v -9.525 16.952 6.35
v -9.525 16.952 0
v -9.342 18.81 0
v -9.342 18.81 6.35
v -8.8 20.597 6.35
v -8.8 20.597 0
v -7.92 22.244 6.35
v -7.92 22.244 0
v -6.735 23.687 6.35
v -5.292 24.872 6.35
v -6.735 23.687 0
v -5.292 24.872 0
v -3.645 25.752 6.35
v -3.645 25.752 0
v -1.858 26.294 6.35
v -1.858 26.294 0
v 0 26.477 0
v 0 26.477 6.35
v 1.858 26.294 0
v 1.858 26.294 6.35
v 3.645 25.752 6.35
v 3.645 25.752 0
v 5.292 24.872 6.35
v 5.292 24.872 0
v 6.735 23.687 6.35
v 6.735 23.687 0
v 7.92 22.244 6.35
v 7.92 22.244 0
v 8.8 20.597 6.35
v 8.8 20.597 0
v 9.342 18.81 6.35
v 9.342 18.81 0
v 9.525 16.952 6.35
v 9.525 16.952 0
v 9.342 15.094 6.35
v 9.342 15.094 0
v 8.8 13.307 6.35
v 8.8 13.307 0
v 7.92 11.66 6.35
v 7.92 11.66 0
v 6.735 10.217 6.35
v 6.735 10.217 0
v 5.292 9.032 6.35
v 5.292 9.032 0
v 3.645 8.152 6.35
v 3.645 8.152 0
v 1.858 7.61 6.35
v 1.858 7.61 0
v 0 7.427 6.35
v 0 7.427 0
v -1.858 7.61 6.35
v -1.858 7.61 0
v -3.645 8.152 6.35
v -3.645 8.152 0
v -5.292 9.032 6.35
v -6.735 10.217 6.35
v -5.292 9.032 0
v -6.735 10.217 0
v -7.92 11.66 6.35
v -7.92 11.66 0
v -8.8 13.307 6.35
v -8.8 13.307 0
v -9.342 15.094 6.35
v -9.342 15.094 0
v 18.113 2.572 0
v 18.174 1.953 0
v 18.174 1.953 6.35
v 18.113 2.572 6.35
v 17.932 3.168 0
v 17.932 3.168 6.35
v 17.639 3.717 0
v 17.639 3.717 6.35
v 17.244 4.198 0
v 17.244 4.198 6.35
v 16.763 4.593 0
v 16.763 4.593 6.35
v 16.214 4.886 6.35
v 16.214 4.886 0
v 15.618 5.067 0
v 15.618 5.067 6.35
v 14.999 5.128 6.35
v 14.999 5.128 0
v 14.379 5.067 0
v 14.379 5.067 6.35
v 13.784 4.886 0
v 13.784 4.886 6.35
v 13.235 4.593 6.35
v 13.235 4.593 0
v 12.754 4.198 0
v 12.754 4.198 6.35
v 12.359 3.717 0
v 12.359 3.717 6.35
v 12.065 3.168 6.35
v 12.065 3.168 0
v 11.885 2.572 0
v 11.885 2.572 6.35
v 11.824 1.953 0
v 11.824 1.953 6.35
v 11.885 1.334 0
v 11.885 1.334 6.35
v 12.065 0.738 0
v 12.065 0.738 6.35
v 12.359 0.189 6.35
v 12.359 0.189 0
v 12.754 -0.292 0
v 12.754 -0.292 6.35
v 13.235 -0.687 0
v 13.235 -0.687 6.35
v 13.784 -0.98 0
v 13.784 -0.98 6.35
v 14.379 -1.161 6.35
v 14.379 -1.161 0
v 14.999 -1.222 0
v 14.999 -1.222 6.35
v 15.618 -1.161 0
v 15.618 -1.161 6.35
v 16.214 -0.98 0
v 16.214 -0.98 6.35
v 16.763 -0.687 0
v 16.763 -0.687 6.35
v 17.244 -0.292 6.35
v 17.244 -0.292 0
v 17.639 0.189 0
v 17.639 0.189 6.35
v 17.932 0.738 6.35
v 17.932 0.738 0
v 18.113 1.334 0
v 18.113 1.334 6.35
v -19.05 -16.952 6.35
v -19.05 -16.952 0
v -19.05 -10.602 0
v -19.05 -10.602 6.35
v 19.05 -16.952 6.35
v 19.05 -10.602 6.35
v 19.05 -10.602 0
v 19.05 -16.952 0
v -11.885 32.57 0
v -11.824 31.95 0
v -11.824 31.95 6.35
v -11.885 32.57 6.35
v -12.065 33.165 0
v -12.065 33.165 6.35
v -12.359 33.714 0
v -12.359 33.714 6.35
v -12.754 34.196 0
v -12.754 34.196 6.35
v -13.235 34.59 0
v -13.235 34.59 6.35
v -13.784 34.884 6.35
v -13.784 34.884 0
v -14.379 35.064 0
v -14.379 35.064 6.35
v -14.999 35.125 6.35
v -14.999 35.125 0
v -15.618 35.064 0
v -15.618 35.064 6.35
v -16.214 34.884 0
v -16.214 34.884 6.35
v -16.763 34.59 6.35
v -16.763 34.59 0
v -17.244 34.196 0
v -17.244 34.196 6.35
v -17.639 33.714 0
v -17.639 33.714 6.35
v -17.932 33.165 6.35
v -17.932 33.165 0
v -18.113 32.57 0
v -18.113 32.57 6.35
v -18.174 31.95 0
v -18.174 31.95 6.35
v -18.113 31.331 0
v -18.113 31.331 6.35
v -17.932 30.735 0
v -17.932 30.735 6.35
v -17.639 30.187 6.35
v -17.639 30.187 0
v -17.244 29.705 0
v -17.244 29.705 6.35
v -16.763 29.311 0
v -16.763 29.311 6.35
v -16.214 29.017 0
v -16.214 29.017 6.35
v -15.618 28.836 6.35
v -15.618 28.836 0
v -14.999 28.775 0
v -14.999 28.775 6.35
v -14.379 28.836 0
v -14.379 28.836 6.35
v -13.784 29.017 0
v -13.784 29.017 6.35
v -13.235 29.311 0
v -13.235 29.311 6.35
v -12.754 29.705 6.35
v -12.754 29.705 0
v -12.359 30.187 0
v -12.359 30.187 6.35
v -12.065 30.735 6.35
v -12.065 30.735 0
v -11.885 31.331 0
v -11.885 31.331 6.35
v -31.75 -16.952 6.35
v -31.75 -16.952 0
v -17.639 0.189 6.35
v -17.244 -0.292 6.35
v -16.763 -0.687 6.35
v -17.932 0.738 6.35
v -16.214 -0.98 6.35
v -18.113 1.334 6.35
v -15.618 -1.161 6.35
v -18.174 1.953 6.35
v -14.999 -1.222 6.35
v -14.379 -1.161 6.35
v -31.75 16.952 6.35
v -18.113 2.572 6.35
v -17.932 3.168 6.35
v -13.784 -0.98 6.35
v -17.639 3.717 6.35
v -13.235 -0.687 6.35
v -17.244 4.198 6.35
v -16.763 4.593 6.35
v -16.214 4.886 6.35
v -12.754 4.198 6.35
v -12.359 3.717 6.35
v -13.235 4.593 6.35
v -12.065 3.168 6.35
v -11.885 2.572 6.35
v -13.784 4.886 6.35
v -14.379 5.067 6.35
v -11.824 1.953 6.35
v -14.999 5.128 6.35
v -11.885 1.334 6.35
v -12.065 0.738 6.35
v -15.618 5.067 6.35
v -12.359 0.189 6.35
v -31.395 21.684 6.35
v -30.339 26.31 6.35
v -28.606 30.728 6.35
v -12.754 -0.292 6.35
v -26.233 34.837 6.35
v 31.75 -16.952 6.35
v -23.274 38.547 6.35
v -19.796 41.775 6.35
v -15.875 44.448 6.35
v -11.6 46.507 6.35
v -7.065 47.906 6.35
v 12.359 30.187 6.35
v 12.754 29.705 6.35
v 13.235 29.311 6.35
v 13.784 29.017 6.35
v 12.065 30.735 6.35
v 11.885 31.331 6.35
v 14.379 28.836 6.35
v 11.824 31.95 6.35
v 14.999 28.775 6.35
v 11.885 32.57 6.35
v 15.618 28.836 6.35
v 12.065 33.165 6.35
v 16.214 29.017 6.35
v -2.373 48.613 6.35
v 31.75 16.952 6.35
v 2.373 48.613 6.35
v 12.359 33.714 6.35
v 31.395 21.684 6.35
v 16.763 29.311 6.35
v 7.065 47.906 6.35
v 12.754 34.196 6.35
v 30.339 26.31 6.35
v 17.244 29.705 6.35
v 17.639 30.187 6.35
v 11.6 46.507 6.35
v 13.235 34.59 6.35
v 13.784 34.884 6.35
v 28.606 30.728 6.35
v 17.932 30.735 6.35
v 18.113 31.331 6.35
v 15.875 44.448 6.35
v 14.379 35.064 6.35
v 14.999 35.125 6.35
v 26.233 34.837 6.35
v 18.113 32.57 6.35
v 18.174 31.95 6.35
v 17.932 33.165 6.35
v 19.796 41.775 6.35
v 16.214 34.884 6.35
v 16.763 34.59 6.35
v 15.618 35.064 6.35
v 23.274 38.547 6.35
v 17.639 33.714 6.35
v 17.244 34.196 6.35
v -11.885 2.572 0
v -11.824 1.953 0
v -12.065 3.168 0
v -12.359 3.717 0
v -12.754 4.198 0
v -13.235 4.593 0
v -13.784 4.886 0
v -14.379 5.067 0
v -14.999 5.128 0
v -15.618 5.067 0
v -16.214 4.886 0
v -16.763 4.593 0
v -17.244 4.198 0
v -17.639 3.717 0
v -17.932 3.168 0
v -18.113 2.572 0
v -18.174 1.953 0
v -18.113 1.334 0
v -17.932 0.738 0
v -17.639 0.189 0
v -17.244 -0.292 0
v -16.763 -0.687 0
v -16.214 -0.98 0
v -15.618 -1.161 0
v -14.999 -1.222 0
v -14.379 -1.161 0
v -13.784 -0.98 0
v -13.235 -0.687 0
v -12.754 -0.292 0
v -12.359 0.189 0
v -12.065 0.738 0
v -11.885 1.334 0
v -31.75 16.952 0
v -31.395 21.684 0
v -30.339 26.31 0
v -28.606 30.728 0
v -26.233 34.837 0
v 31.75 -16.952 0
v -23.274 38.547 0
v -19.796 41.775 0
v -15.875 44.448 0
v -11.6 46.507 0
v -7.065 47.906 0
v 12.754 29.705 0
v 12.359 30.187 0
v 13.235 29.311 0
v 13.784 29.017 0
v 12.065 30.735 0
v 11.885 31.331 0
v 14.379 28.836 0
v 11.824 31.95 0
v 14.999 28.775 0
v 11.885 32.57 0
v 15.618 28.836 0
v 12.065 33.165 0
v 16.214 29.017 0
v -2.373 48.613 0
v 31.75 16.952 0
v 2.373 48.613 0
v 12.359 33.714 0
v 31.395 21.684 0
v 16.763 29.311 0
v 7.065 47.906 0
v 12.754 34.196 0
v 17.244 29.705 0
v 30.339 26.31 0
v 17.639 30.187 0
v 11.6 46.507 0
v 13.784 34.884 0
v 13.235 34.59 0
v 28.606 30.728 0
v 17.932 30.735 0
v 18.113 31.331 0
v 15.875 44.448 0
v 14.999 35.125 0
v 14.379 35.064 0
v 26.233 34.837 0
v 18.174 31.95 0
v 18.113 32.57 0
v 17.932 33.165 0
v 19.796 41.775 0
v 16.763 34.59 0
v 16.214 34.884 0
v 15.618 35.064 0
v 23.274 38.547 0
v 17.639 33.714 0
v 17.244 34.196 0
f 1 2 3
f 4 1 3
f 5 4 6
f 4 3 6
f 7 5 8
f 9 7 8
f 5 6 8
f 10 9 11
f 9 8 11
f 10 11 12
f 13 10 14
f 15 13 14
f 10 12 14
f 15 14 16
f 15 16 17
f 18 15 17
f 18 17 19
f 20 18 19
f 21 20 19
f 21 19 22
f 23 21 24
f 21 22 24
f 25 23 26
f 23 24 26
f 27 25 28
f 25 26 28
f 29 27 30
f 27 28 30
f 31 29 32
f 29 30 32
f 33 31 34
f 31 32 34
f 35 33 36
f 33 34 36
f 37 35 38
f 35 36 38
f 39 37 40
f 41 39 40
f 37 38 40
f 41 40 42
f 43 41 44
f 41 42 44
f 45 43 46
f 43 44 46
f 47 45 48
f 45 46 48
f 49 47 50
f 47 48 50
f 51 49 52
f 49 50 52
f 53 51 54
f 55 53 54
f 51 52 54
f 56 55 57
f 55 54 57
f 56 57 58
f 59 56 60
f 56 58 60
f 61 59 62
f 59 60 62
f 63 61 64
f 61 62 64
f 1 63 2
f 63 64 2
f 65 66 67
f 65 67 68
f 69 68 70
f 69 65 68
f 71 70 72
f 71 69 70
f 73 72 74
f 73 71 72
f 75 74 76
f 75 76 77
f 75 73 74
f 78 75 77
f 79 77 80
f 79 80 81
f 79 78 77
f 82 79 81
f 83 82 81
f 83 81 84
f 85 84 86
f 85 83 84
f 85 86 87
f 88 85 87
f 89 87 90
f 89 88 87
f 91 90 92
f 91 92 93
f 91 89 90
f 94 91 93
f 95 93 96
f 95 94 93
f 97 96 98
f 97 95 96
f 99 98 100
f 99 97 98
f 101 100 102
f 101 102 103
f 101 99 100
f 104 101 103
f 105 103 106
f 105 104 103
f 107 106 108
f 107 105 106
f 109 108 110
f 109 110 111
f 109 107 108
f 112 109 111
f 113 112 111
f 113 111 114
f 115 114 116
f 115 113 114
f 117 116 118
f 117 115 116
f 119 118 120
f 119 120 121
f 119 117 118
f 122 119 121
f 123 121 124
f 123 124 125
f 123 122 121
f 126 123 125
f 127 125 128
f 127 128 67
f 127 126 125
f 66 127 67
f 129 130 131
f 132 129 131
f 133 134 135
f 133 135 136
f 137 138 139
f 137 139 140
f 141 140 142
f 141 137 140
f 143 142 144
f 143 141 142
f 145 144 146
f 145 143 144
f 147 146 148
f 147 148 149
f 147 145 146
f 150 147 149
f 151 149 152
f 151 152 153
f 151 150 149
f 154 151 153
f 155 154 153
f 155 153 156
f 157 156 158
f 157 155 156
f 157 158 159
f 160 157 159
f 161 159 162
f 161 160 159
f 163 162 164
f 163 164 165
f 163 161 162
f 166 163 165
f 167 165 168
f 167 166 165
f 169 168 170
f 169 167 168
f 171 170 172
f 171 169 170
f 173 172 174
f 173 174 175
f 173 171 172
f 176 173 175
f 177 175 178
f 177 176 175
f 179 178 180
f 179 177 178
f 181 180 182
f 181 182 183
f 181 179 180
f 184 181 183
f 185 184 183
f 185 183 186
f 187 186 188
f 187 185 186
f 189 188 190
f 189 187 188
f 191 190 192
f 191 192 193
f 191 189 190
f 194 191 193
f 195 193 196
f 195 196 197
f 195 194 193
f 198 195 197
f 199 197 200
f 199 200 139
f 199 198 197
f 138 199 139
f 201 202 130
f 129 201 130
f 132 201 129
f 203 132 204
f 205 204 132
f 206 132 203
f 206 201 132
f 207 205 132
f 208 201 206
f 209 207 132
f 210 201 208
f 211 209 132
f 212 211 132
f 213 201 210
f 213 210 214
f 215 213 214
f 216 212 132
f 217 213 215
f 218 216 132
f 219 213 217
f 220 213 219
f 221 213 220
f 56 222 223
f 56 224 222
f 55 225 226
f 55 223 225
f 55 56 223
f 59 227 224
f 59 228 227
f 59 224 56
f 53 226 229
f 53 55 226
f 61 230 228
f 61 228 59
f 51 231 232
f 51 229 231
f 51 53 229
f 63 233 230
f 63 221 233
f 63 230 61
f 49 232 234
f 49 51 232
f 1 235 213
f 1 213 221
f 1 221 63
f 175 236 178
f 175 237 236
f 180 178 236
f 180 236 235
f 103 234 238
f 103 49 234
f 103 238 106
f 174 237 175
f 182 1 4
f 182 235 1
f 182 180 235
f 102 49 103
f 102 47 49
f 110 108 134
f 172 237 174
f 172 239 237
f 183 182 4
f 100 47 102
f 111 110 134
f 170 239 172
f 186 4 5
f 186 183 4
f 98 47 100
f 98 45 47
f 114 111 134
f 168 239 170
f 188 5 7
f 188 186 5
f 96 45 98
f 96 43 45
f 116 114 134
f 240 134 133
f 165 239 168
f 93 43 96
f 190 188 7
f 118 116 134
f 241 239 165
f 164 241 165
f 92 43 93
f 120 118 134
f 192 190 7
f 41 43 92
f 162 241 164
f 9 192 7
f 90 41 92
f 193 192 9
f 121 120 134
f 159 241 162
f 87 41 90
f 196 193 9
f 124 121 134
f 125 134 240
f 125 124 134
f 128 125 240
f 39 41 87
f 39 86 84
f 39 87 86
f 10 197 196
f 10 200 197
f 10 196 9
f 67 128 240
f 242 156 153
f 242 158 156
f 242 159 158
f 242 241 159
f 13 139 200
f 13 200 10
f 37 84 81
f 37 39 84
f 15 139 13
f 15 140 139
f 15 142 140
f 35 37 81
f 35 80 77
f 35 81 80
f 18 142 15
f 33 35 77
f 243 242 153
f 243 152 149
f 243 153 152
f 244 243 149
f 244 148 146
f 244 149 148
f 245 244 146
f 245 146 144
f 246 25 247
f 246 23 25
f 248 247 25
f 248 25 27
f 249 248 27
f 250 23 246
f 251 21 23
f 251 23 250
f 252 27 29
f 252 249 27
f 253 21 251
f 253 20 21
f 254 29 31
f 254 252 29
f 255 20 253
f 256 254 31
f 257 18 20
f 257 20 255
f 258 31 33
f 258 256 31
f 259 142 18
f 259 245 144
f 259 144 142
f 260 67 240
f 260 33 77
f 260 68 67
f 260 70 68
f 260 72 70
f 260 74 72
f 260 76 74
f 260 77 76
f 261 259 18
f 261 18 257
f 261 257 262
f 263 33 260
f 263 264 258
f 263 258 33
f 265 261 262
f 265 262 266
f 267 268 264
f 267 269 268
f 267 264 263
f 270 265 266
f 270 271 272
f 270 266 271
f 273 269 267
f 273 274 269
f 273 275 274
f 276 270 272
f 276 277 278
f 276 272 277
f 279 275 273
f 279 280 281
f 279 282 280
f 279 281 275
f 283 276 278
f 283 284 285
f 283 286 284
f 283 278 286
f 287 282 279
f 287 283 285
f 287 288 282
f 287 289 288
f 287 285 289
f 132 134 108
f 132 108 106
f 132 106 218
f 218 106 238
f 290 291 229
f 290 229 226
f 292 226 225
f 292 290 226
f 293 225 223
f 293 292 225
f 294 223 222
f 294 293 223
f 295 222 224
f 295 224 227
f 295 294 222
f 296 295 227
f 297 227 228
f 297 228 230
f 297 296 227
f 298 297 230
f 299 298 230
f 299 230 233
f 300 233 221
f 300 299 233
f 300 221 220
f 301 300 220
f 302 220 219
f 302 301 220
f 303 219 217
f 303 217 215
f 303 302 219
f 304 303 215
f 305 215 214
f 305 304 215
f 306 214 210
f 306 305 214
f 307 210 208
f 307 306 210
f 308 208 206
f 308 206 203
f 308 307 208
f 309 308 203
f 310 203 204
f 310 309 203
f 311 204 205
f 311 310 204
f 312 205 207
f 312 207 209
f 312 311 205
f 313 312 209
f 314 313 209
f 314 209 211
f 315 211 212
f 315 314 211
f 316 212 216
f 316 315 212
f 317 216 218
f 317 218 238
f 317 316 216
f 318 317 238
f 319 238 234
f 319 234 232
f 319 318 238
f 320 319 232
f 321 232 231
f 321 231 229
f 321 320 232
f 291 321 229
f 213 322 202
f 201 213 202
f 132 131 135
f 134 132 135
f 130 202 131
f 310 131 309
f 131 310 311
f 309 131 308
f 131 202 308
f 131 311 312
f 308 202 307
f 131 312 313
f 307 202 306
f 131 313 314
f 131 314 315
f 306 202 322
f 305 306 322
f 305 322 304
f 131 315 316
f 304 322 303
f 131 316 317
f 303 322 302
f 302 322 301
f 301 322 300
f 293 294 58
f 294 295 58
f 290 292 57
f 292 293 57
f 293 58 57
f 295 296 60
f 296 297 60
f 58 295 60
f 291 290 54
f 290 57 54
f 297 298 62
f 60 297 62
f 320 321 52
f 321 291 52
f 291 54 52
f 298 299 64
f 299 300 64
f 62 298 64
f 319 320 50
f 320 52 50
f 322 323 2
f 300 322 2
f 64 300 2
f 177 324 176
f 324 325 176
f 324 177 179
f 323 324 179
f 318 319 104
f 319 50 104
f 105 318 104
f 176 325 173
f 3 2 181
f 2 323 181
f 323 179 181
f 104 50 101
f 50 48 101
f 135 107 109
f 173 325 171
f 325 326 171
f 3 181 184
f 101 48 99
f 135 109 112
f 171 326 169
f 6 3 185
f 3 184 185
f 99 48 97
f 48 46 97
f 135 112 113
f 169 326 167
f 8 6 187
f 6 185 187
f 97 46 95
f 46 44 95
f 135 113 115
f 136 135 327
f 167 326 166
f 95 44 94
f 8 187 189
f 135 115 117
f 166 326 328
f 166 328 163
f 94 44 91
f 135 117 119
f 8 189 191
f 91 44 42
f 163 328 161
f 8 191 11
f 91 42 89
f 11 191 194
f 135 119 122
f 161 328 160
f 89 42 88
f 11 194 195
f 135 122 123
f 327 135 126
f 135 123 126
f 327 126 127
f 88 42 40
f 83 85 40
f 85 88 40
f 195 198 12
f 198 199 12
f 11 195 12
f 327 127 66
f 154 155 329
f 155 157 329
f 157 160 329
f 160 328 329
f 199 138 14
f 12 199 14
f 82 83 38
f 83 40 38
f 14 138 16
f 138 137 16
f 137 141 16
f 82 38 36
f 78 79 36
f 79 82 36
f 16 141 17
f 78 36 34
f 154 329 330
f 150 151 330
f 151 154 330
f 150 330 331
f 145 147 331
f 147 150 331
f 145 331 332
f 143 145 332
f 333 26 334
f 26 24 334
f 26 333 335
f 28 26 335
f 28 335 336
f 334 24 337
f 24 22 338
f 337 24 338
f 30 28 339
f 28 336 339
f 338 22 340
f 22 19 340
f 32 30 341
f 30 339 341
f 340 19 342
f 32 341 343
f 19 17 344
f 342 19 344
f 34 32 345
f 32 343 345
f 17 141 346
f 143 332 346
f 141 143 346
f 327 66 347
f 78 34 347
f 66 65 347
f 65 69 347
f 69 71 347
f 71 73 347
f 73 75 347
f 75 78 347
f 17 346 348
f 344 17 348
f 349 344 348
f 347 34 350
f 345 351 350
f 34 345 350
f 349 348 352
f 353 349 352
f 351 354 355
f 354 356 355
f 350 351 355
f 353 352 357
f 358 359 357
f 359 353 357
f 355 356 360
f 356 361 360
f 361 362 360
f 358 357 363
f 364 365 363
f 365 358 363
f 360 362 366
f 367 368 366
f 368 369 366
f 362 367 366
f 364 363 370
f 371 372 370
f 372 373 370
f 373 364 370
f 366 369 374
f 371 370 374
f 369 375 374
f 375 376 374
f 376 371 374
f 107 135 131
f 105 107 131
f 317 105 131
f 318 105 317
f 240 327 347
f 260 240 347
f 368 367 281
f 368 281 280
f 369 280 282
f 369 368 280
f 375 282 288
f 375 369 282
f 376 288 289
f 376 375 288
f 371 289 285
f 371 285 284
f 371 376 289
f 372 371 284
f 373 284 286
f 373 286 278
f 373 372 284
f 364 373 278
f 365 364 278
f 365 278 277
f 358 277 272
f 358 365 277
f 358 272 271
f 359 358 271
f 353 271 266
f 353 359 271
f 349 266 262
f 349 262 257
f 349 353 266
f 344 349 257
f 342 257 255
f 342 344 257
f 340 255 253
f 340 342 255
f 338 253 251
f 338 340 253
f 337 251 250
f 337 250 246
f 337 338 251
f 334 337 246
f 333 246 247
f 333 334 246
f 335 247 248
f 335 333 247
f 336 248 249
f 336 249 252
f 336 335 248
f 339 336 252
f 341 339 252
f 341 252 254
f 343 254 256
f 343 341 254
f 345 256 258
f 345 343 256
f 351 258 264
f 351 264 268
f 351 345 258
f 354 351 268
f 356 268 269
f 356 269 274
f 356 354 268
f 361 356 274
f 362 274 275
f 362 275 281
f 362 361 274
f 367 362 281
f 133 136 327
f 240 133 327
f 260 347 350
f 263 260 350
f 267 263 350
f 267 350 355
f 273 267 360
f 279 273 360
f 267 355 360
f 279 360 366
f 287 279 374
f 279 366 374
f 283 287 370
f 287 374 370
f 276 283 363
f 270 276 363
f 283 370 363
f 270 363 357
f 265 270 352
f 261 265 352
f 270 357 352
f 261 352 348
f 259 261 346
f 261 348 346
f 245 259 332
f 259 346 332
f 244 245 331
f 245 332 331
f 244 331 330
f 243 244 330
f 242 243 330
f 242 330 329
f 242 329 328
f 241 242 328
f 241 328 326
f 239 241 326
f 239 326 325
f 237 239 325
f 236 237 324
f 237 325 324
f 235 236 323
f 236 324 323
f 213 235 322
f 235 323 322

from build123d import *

# Parameters (mm, degrees)
F0_R     = 3.175
F1_DEPTH = 6.35


with BuildPart() as f1:
    # F0 (on Top) → F1 (new body)
    with BuildSketch(Plane.XY):
        with BuildLine():
            Line((31.75, -16.951759), (31.75, 16.951759))
            Line((31.75, 16.951759), (9.525, 16.951759))
            ThreePointArc((9.525, 16.951759), (0, 7.426759), (-9.525, 16.951759))
            Line((-9.525, 16.951759), (-31.75, 16.951759))
            Line((-31.75, 16.951759), (-31.75, -16.951759))
            Line((-31.75, -16.951759), (-19.05, -16.951759))
            Line((-19.05, -16.951759), (-19.05, -10.601759))
            Line((-19.05, -10.601759), (19.05, -10.601759))
            Line((19.05, -10.601759), (19.05, -16.951759))
            Line((19.05, -16.951759), (31.75, -16.951759))
        make_face()
        with Locations((-14.9987, 1.953059)):
            Circle(F0_R, mode=Mode.SUBTRACT)
        with Locations((14.9987, 1.953059)):
            Circle(F0_R, mode=Mode.SUBTRACT)
        with BuildLine():
            Line((9.525, 16.951759), (31.75, 16.951759))
            ThreePointArc((31.75, 16.951759), (0, 48.701759), (-31.75, 16.951759))
            Line((-31.75, 16.951759), (-9.525, 16.951759))
            ThreePointArc((-9.525, 16.951759), (0, 26.476759), (9.525, 16.951759))
        make_face()
        with Locations((-14.9987, 31.950459)):
            Circle(F0_R, mode=Mode.SUBTRACT)
        with Locations((14.9987, 31.950459)):
            Circle(F0_R, mode=Mode.SUBTRACT)
    extrude(amount=F1_DEPTH)


solid = f1.part
